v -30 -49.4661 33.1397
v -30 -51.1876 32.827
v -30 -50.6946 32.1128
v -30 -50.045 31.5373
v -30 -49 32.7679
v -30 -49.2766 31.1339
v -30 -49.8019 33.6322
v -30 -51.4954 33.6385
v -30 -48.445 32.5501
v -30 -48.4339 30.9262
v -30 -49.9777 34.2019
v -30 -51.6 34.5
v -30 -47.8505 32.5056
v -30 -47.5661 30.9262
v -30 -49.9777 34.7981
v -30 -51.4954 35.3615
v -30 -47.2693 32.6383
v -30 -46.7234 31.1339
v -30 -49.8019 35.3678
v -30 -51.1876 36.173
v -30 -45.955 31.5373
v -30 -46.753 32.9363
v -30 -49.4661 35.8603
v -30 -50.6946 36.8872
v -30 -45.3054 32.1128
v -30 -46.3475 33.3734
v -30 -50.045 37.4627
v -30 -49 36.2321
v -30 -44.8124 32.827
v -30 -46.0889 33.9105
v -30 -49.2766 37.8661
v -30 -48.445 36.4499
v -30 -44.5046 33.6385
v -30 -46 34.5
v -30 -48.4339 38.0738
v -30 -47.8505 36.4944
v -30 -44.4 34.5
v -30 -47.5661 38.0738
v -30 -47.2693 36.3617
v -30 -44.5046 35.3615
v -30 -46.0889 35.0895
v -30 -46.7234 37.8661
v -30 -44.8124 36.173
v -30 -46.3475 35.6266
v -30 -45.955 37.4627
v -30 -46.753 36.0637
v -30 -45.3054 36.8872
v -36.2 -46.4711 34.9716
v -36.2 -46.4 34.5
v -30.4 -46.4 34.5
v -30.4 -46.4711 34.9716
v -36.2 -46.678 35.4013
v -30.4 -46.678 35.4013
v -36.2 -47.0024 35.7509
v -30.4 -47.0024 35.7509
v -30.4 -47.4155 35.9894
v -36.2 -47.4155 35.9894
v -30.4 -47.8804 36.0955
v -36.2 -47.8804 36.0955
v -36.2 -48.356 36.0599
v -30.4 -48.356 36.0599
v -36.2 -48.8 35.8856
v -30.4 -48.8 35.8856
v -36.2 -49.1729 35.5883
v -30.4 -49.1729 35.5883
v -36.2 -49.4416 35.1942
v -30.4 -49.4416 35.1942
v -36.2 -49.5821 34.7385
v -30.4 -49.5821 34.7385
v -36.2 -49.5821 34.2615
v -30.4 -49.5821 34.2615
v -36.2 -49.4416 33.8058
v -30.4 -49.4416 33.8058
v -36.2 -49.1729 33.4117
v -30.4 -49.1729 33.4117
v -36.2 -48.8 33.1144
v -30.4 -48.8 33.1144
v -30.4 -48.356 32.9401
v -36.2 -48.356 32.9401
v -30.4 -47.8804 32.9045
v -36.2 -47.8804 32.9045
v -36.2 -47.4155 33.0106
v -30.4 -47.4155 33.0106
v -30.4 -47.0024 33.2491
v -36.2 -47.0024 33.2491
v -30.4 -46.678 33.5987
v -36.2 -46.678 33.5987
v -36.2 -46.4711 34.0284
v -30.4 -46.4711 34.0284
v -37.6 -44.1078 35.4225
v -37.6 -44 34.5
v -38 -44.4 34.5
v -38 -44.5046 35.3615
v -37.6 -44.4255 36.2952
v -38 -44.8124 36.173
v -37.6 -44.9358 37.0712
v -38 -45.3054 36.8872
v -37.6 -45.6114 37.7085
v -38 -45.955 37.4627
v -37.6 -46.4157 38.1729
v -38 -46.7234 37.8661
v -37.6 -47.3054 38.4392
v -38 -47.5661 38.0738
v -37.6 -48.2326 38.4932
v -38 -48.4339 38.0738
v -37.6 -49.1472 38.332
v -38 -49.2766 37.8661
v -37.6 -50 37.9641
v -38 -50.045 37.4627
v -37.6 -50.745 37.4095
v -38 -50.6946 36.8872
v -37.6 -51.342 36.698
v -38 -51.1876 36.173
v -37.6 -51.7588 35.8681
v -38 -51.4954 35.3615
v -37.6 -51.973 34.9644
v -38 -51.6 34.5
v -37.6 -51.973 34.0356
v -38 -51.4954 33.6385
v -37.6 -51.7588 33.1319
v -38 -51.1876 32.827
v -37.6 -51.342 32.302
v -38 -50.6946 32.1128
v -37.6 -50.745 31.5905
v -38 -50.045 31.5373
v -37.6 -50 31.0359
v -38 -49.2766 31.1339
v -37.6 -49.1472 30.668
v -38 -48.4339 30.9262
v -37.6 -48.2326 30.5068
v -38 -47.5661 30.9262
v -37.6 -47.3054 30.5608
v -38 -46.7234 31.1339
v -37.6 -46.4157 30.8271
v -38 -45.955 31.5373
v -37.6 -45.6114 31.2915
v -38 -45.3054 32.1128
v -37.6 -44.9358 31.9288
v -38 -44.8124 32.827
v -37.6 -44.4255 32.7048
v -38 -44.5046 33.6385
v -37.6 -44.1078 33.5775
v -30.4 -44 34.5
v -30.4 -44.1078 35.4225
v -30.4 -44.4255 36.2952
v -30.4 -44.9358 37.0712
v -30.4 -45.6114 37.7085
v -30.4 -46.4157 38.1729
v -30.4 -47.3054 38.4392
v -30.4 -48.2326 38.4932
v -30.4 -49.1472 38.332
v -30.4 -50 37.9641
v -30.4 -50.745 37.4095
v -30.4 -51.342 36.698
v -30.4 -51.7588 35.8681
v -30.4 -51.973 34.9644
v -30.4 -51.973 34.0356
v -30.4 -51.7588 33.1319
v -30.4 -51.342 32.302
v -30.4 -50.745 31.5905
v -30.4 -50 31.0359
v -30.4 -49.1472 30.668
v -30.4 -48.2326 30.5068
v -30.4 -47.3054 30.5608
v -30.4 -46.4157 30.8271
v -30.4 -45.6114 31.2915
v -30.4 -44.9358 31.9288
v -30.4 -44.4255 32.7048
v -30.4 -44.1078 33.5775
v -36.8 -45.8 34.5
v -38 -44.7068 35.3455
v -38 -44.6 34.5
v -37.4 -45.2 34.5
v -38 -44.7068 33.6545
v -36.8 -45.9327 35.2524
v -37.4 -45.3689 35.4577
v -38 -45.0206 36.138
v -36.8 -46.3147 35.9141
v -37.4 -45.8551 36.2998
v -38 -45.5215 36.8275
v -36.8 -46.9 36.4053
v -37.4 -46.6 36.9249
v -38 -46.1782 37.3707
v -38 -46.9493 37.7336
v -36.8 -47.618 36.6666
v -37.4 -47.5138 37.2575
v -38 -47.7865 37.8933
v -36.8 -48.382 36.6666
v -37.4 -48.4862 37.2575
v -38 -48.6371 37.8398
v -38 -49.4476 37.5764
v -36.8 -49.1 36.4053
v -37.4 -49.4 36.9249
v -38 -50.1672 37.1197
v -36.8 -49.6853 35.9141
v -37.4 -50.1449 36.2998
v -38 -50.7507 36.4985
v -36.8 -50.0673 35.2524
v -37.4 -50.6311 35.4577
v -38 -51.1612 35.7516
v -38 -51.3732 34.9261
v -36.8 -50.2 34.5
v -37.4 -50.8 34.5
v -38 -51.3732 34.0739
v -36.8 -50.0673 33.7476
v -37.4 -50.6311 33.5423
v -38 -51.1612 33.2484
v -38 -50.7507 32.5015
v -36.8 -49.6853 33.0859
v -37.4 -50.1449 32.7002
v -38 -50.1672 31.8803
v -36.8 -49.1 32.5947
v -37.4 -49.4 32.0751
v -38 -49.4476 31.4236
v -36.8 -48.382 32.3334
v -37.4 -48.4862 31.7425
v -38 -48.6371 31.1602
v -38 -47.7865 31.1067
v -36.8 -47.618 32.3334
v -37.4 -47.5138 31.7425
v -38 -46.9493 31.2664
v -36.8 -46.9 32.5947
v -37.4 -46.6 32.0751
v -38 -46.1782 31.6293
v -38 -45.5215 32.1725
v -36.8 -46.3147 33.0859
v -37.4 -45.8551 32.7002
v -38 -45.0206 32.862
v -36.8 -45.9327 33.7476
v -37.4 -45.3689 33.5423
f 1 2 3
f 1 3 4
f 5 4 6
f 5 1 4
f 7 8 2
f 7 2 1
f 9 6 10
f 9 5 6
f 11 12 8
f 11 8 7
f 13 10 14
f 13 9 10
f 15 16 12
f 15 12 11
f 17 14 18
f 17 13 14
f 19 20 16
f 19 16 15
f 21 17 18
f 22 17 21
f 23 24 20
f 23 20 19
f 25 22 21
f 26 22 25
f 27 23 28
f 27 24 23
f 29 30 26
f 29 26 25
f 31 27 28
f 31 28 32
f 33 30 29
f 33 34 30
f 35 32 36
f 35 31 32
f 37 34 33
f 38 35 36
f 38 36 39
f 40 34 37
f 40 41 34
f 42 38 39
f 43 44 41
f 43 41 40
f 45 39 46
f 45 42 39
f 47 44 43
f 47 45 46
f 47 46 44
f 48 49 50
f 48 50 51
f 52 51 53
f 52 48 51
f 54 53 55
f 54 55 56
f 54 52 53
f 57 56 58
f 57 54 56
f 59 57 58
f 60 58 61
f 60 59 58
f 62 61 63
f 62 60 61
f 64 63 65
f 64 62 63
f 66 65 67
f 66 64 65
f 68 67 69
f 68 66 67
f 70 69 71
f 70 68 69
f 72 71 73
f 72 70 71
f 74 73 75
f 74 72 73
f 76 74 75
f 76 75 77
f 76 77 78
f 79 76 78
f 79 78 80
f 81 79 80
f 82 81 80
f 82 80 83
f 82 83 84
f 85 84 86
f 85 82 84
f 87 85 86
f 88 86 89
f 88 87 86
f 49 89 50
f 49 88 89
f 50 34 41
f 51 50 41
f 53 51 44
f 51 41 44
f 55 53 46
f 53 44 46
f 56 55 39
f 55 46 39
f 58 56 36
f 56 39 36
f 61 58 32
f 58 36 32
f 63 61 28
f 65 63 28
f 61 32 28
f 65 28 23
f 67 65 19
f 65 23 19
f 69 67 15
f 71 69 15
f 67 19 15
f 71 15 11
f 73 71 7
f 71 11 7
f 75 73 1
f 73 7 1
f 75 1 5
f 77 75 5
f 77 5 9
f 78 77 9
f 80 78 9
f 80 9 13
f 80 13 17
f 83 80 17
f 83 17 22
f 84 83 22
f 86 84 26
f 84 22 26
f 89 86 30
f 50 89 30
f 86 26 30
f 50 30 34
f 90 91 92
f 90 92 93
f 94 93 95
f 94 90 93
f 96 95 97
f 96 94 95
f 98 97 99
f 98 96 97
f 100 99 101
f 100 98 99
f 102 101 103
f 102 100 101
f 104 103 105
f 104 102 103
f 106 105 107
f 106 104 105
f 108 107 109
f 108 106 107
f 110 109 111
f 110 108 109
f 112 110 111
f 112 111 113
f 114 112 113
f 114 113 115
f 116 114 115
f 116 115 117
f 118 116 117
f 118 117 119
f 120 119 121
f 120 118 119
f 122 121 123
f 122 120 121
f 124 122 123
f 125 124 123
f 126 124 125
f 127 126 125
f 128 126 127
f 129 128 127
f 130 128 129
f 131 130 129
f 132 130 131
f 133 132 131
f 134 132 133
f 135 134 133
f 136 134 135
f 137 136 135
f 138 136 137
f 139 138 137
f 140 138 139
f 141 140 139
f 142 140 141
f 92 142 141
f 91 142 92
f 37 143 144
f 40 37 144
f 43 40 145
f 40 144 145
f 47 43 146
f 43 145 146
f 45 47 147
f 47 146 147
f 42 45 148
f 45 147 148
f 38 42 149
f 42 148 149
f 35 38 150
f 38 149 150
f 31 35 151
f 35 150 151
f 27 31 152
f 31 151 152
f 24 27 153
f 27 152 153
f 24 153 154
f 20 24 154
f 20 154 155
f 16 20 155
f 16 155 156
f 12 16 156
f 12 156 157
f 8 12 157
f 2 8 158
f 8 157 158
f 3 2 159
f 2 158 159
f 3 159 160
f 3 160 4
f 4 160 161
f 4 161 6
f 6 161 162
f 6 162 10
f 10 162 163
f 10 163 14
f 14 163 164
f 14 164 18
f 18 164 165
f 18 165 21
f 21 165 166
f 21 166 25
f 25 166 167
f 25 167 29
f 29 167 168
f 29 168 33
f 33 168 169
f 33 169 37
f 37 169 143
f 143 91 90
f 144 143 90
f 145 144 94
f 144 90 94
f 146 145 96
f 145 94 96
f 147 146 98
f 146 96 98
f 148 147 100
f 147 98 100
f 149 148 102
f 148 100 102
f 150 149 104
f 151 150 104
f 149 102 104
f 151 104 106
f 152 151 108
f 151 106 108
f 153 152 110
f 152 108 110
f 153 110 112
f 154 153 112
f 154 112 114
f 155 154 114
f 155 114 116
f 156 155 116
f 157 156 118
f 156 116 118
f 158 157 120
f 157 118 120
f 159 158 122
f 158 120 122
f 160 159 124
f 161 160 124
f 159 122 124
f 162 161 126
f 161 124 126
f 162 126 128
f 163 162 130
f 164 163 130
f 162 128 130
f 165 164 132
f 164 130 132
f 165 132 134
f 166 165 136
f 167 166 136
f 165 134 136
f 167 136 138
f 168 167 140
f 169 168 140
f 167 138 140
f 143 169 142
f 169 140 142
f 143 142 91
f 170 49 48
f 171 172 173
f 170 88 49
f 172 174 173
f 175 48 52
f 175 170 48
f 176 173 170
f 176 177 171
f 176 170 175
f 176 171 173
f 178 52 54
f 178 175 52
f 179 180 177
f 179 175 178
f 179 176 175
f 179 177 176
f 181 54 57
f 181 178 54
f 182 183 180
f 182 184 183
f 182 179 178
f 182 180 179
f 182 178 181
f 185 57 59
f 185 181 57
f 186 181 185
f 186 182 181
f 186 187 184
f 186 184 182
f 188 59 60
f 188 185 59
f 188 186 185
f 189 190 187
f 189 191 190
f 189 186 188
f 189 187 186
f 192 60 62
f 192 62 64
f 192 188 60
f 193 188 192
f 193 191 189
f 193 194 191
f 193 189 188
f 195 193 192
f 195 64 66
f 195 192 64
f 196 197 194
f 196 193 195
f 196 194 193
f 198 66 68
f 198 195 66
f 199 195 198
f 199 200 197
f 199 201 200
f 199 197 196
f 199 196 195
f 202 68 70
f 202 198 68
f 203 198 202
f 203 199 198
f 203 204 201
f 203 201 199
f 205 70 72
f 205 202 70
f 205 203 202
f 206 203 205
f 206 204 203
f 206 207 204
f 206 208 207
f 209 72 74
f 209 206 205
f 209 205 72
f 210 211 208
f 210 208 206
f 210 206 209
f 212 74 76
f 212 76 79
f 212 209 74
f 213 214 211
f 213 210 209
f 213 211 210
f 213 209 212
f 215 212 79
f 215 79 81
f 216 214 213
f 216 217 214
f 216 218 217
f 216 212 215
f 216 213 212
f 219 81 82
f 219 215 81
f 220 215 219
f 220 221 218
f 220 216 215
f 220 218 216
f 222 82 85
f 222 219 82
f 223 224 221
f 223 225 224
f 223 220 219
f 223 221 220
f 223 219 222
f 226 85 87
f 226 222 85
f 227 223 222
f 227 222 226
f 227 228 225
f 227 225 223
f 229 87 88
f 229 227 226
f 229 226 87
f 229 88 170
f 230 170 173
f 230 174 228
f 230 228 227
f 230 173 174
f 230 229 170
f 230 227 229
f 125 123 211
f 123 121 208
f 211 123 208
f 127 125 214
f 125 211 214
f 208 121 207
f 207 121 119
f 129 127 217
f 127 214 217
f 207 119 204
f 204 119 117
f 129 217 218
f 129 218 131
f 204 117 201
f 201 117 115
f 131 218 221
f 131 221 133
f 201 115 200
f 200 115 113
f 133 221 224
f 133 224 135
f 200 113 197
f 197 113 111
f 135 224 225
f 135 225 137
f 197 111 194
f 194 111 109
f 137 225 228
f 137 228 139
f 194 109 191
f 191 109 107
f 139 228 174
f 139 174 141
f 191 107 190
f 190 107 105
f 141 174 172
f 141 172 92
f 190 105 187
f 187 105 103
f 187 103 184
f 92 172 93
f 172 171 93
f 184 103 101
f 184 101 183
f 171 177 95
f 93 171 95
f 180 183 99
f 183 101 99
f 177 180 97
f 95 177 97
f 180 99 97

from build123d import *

# Parameters (mm, degrees)
SKETCH112_R     = 4
SKETCH112_R_2   = 1.6
PAD058_DEPTH    = 8
CHAMFER039_SIZE = 1.8
CHAMFER040_SIZE = 0.4


with BuildPart() as part:
    # Sketch112 → Pad058 (new body)
    with BuildSketch(Plane.YZ):
        Circle(SKETCH112_R)
        Circle(SKETCH112_R_2, mode=Mode.SUBTRACT)
    extrude(amount=PAD058_DEPTH)

    # Chamfer039
    chamfer039_edges = [part.edges().sort_by_distance(p)[0] for p in [
        (0, -1.6, 0),
    ]]
    chamfer(chamfer039_edges, length=CHAMFER039_SIZE)

    # Chamfer040
    chamfer040_edges = [part.edges().sort_by_distance(p)[0] for p in [
        (0, -4, 0),
        (8, -4, 0),
        (8, -1.6, 0),
    ]]
    chamfer(chamfer040_edges, length=CHAMFER040_SIZE)


with BuildPart() as part_1:
    # Body045 placement: moved
    add(part.part.moved(Location((-38, -48, 34.5))))


solid = part_1.part
